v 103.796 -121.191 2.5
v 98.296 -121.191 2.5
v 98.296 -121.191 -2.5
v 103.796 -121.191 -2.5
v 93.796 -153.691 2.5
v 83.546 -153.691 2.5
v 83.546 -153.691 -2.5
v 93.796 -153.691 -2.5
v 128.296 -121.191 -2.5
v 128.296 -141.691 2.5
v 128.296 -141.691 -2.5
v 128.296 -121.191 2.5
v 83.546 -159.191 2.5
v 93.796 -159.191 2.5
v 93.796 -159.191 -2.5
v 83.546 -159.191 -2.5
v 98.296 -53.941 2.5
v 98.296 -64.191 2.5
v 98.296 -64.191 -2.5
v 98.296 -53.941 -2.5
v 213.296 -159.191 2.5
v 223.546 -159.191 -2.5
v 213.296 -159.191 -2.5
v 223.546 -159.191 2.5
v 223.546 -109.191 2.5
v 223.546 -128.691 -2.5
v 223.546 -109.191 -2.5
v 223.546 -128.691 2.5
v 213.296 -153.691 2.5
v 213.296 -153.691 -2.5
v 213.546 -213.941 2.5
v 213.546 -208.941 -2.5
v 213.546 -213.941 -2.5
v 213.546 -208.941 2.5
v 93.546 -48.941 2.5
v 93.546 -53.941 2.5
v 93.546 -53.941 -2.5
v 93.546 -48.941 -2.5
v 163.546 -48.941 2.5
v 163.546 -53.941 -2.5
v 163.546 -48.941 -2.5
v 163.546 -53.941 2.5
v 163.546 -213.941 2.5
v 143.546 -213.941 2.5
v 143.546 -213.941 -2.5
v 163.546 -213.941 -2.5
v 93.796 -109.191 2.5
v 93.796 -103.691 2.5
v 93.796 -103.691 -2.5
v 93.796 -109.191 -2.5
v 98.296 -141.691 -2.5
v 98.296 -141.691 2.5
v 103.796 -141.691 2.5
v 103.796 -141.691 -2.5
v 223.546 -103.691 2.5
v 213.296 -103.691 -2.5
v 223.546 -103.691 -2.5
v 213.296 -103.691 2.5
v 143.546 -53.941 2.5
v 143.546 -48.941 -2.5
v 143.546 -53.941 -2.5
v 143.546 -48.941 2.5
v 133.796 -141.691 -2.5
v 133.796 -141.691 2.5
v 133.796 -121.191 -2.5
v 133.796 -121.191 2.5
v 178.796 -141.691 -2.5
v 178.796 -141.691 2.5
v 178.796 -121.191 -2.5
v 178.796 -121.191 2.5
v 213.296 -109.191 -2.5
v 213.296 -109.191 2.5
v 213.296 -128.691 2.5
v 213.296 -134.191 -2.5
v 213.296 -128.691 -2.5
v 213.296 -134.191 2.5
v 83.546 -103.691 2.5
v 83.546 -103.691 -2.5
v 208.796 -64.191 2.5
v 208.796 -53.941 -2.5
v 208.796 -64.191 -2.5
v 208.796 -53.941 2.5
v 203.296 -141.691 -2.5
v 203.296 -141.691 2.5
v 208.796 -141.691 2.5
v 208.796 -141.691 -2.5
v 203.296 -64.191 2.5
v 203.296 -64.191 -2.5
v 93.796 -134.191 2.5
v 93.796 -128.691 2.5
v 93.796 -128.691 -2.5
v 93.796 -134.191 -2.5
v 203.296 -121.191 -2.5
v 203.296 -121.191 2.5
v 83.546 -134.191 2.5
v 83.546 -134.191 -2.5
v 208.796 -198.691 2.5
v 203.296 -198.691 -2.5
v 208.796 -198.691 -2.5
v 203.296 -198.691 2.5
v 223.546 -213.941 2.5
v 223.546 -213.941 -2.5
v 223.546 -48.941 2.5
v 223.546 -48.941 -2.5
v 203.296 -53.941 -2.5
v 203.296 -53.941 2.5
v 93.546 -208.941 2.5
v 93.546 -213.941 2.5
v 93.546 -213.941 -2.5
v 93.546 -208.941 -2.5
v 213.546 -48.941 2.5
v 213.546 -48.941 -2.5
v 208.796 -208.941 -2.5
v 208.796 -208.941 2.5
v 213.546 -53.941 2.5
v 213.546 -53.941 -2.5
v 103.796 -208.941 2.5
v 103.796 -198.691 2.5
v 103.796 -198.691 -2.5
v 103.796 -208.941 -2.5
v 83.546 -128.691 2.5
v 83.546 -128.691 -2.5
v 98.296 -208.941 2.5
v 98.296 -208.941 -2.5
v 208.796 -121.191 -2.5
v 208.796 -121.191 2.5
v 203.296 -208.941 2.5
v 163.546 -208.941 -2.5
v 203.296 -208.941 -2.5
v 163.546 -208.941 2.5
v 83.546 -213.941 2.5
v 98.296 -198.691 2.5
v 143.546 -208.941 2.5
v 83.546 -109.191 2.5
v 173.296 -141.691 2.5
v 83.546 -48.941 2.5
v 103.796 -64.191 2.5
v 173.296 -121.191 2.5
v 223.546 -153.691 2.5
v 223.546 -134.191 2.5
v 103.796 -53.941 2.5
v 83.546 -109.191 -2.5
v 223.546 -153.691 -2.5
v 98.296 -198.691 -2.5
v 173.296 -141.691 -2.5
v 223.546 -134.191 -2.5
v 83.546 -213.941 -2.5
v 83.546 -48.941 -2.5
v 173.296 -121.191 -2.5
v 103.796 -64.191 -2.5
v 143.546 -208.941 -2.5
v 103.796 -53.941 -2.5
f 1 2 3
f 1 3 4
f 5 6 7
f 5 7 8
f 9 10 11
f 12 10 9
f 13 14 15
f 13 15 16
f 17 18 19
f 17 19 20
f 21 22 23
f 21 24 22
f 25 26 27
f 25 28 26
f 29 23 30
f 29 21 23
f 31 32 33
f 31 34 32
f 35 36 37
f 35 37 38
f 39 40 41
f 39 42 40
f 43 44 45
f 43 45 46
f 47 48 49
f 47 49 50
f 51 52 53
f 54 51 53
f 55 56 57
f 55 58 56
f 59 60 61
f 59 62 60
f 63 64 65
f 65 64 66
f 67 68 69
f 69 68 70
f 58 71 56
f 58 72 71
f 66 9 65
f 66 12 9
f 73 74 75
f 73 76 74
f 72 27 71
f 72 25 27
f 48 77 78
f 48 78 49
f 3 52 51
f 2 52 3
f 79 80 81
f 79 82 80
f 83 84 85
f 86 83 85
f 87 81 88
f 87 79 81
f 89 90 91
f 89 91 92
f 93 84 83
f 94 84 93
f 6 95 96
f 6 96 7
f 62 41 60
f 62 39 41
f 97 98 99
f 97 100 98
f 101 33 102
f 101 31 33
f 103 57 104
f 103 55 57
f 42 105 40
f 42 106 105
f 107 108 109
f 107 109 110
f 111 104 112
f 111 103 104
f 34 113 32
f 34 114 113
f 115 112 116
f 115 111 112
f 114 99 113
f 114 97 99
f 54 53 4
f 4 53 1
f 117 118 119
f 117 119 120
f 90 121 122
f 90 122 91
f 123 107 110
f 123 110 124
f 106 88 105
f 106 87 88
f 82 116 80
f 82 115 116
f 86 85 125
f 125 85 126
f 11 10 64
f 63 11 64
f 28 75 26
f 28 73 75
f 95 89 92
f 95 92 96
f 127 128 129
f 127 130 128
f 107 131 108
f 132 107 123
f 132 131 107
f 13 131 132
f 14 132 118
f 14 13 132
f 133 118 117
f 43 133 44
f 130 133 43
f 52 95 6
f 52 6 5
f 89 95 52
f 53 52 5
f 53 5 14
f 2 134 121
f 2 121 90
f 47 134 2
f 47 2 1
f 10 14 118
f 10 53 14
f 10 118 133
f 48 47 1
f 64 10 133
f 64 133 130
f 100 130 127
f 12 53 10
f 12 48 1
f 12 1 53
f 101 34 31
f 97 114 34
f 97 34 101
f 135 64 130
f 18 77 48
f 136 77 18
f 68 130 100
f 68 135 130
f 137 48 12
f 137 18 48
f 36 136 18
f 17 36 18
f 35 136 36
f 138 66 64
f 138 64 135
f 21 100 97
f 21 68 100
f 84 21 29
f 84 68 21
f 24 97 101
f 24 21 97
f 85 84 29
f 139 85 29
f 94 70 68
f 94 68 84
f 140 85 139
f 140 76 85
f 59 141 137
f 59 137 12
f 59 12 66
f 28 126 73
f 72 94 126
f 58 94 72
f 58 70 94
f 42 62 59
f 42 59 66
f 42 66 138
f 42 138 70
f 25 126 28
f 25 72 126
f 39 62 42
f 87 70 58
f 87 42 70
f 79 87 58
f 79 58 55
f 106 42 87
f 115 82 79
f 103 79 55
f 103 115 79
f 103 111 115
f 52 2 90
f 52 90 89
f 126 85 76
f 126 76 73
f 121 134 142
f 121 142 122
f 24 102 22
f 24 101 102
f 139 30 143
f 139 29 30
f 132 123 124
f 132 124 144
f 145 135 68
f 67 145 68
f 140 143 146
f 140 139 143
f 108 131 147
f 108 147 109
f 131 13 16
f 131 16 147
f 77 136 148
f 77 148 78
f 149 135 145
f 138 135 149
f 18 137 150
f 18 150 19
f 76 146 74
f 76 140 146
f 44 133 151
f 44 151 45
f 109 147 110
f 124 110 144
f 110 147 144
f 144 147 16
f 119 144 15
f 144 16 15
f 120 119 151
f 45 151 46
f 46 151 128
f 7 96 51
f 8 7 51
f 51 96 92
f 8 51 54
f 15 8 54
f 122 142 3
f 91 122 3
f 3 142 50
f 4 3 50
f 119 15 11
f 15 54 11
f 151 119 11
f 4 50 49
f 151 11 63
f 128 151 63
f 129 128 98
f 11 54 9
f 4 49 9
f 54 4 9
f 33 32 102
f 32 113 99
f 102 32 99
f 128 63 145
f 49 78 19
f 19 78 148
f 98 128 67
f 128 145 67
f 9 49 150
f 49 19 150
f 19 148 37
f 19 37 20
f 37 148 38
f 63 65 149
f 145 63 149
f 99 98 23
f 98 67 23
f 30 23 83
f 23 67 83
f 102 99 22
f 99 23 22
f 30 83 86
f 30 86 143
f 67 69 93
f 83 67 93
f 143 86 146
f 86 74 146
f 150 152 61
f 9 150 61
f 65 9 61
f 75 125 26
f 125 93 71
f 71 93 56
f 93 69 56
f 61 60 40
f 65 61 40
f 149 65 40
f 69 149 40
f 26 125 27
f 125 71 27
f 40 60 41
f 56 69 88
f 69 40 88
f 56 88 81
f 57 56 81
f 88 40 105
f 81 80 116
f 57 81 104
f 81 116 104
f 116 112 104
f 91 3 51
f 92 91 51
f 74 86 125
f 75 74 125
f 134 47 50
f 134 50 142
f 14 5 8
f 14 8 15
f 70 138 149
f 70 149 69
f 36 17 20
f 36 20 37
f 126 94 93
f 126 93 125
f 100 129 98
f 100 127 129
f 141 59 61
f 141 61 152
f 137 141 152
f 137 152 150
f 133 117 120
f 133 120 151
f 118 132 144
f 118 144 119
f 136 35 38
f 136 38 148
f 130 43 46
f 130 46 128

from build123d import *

# Parameters (mm, degrees)
SKETCH1_W           = 5.5
SKETCH1_H           = 20.5
BOSS_EXTRUDE1_DEPTH = 2.5


with BuildPart() as part:
    # Sketch1 → Boss-Extrude1 (new, symmetric)
    with BuildSketch(Plane.XY):
        Polygon((143.545659386, -48.941167375), (143.545659386, -53.941167375), (103.795659386, -53.941167375), (103.795659386, -64.191167375), (98.295659386, -64.191167375), (98.295659386, -53.941167375), (93.545659386, -53.941167375), (93.545659386, -48.941167375), (83.545659386, -48.941167375), (83.545659386, -103.691167375), (93.795659386, -103.691167375), (93.795659386, -109.191167375), (83.545659386, -109.191167375), (83.545659386, -128.691167375), (93.795659386, -128.691167375), (93.795659386, -134.191167375), (83.545659386, -134.191167375), (83.545659386, -153.691167375), (93.795659386, -153.691167375), (93.795659386, -159.191167375), (83.545659386, -159.191167375), (83.545659386, -213.941167375), (93.545659386, -213.941167375), (93.545659386, -208.941167375), (98.295659386, -208.941167375), (98.295659386, -198.691167375), (103.795659386, -198.691167375), (103.795659386, -208.941167375), (143.545659386, -208.941167375), (143.545659386, -213.941167375), (163.545659386, -213.941167375), (163.545659386, -208.941167375), (203.295659386, -208.941167375), (203.295659386, -198.691167375), (208.795659386, -198.691167375), (208.795659386, -208.941167375), (213.545659386, -208.941167375), (213.545659386, -213.941167375), (223.545659386, -213.941167375), (223.545659386, -159.191167375), (213.295659386, -159.191167375), (213.295659386, -153.691167375), (223.545659386, -153.691167375), (223.545659386, -134.191167375), (213.295659386, -134.191167375), (213.295659386, -128.691167375), (223.545659386, -128.691167375), (223.545659386, -109.191167375), (213.295659386, -109.191167375), (213.295659386, -103.691167375), (223.545659386, -103.691167375), (223.545659386, -48.941167375), (213.545659386, -48.941167375), (213.545659386, -53.941167375), (208.795659386, -53.941167375), (208.795659386, -64.191167375), (203.295659386, -64.191167375), (203.295659386, -53.941167375), (163.545659386, -53.941167375), (163.545659386, -48.941167375), align=None)
        with Locations((101.045659386, -131.441167375)):
            Rectangle(SKETCH1_W, SKETCH1_H, mode=Mode.SUBTRACT)
        with Locations((206.045659386, -131.441167375)):
            Rectangle(SKETCH1_W, SKETCH1_H, mode=Mode.SUBTRACT)
        with Locations((176.045659386, -131.441167375)):
            Rectangle(SKETCH1_W, SKETCH1_H, mode=Mode.SUBTRACT)
        with Locations((131.045659386, -131.441167375)):
            Rectangle(SKETCH1_W, SKETCH1_H, mode=Mode.SUBTRACT)
    extrude(amount=BOSS_EXTRUDE1_DEPTH, both=True)


solid = part.part
